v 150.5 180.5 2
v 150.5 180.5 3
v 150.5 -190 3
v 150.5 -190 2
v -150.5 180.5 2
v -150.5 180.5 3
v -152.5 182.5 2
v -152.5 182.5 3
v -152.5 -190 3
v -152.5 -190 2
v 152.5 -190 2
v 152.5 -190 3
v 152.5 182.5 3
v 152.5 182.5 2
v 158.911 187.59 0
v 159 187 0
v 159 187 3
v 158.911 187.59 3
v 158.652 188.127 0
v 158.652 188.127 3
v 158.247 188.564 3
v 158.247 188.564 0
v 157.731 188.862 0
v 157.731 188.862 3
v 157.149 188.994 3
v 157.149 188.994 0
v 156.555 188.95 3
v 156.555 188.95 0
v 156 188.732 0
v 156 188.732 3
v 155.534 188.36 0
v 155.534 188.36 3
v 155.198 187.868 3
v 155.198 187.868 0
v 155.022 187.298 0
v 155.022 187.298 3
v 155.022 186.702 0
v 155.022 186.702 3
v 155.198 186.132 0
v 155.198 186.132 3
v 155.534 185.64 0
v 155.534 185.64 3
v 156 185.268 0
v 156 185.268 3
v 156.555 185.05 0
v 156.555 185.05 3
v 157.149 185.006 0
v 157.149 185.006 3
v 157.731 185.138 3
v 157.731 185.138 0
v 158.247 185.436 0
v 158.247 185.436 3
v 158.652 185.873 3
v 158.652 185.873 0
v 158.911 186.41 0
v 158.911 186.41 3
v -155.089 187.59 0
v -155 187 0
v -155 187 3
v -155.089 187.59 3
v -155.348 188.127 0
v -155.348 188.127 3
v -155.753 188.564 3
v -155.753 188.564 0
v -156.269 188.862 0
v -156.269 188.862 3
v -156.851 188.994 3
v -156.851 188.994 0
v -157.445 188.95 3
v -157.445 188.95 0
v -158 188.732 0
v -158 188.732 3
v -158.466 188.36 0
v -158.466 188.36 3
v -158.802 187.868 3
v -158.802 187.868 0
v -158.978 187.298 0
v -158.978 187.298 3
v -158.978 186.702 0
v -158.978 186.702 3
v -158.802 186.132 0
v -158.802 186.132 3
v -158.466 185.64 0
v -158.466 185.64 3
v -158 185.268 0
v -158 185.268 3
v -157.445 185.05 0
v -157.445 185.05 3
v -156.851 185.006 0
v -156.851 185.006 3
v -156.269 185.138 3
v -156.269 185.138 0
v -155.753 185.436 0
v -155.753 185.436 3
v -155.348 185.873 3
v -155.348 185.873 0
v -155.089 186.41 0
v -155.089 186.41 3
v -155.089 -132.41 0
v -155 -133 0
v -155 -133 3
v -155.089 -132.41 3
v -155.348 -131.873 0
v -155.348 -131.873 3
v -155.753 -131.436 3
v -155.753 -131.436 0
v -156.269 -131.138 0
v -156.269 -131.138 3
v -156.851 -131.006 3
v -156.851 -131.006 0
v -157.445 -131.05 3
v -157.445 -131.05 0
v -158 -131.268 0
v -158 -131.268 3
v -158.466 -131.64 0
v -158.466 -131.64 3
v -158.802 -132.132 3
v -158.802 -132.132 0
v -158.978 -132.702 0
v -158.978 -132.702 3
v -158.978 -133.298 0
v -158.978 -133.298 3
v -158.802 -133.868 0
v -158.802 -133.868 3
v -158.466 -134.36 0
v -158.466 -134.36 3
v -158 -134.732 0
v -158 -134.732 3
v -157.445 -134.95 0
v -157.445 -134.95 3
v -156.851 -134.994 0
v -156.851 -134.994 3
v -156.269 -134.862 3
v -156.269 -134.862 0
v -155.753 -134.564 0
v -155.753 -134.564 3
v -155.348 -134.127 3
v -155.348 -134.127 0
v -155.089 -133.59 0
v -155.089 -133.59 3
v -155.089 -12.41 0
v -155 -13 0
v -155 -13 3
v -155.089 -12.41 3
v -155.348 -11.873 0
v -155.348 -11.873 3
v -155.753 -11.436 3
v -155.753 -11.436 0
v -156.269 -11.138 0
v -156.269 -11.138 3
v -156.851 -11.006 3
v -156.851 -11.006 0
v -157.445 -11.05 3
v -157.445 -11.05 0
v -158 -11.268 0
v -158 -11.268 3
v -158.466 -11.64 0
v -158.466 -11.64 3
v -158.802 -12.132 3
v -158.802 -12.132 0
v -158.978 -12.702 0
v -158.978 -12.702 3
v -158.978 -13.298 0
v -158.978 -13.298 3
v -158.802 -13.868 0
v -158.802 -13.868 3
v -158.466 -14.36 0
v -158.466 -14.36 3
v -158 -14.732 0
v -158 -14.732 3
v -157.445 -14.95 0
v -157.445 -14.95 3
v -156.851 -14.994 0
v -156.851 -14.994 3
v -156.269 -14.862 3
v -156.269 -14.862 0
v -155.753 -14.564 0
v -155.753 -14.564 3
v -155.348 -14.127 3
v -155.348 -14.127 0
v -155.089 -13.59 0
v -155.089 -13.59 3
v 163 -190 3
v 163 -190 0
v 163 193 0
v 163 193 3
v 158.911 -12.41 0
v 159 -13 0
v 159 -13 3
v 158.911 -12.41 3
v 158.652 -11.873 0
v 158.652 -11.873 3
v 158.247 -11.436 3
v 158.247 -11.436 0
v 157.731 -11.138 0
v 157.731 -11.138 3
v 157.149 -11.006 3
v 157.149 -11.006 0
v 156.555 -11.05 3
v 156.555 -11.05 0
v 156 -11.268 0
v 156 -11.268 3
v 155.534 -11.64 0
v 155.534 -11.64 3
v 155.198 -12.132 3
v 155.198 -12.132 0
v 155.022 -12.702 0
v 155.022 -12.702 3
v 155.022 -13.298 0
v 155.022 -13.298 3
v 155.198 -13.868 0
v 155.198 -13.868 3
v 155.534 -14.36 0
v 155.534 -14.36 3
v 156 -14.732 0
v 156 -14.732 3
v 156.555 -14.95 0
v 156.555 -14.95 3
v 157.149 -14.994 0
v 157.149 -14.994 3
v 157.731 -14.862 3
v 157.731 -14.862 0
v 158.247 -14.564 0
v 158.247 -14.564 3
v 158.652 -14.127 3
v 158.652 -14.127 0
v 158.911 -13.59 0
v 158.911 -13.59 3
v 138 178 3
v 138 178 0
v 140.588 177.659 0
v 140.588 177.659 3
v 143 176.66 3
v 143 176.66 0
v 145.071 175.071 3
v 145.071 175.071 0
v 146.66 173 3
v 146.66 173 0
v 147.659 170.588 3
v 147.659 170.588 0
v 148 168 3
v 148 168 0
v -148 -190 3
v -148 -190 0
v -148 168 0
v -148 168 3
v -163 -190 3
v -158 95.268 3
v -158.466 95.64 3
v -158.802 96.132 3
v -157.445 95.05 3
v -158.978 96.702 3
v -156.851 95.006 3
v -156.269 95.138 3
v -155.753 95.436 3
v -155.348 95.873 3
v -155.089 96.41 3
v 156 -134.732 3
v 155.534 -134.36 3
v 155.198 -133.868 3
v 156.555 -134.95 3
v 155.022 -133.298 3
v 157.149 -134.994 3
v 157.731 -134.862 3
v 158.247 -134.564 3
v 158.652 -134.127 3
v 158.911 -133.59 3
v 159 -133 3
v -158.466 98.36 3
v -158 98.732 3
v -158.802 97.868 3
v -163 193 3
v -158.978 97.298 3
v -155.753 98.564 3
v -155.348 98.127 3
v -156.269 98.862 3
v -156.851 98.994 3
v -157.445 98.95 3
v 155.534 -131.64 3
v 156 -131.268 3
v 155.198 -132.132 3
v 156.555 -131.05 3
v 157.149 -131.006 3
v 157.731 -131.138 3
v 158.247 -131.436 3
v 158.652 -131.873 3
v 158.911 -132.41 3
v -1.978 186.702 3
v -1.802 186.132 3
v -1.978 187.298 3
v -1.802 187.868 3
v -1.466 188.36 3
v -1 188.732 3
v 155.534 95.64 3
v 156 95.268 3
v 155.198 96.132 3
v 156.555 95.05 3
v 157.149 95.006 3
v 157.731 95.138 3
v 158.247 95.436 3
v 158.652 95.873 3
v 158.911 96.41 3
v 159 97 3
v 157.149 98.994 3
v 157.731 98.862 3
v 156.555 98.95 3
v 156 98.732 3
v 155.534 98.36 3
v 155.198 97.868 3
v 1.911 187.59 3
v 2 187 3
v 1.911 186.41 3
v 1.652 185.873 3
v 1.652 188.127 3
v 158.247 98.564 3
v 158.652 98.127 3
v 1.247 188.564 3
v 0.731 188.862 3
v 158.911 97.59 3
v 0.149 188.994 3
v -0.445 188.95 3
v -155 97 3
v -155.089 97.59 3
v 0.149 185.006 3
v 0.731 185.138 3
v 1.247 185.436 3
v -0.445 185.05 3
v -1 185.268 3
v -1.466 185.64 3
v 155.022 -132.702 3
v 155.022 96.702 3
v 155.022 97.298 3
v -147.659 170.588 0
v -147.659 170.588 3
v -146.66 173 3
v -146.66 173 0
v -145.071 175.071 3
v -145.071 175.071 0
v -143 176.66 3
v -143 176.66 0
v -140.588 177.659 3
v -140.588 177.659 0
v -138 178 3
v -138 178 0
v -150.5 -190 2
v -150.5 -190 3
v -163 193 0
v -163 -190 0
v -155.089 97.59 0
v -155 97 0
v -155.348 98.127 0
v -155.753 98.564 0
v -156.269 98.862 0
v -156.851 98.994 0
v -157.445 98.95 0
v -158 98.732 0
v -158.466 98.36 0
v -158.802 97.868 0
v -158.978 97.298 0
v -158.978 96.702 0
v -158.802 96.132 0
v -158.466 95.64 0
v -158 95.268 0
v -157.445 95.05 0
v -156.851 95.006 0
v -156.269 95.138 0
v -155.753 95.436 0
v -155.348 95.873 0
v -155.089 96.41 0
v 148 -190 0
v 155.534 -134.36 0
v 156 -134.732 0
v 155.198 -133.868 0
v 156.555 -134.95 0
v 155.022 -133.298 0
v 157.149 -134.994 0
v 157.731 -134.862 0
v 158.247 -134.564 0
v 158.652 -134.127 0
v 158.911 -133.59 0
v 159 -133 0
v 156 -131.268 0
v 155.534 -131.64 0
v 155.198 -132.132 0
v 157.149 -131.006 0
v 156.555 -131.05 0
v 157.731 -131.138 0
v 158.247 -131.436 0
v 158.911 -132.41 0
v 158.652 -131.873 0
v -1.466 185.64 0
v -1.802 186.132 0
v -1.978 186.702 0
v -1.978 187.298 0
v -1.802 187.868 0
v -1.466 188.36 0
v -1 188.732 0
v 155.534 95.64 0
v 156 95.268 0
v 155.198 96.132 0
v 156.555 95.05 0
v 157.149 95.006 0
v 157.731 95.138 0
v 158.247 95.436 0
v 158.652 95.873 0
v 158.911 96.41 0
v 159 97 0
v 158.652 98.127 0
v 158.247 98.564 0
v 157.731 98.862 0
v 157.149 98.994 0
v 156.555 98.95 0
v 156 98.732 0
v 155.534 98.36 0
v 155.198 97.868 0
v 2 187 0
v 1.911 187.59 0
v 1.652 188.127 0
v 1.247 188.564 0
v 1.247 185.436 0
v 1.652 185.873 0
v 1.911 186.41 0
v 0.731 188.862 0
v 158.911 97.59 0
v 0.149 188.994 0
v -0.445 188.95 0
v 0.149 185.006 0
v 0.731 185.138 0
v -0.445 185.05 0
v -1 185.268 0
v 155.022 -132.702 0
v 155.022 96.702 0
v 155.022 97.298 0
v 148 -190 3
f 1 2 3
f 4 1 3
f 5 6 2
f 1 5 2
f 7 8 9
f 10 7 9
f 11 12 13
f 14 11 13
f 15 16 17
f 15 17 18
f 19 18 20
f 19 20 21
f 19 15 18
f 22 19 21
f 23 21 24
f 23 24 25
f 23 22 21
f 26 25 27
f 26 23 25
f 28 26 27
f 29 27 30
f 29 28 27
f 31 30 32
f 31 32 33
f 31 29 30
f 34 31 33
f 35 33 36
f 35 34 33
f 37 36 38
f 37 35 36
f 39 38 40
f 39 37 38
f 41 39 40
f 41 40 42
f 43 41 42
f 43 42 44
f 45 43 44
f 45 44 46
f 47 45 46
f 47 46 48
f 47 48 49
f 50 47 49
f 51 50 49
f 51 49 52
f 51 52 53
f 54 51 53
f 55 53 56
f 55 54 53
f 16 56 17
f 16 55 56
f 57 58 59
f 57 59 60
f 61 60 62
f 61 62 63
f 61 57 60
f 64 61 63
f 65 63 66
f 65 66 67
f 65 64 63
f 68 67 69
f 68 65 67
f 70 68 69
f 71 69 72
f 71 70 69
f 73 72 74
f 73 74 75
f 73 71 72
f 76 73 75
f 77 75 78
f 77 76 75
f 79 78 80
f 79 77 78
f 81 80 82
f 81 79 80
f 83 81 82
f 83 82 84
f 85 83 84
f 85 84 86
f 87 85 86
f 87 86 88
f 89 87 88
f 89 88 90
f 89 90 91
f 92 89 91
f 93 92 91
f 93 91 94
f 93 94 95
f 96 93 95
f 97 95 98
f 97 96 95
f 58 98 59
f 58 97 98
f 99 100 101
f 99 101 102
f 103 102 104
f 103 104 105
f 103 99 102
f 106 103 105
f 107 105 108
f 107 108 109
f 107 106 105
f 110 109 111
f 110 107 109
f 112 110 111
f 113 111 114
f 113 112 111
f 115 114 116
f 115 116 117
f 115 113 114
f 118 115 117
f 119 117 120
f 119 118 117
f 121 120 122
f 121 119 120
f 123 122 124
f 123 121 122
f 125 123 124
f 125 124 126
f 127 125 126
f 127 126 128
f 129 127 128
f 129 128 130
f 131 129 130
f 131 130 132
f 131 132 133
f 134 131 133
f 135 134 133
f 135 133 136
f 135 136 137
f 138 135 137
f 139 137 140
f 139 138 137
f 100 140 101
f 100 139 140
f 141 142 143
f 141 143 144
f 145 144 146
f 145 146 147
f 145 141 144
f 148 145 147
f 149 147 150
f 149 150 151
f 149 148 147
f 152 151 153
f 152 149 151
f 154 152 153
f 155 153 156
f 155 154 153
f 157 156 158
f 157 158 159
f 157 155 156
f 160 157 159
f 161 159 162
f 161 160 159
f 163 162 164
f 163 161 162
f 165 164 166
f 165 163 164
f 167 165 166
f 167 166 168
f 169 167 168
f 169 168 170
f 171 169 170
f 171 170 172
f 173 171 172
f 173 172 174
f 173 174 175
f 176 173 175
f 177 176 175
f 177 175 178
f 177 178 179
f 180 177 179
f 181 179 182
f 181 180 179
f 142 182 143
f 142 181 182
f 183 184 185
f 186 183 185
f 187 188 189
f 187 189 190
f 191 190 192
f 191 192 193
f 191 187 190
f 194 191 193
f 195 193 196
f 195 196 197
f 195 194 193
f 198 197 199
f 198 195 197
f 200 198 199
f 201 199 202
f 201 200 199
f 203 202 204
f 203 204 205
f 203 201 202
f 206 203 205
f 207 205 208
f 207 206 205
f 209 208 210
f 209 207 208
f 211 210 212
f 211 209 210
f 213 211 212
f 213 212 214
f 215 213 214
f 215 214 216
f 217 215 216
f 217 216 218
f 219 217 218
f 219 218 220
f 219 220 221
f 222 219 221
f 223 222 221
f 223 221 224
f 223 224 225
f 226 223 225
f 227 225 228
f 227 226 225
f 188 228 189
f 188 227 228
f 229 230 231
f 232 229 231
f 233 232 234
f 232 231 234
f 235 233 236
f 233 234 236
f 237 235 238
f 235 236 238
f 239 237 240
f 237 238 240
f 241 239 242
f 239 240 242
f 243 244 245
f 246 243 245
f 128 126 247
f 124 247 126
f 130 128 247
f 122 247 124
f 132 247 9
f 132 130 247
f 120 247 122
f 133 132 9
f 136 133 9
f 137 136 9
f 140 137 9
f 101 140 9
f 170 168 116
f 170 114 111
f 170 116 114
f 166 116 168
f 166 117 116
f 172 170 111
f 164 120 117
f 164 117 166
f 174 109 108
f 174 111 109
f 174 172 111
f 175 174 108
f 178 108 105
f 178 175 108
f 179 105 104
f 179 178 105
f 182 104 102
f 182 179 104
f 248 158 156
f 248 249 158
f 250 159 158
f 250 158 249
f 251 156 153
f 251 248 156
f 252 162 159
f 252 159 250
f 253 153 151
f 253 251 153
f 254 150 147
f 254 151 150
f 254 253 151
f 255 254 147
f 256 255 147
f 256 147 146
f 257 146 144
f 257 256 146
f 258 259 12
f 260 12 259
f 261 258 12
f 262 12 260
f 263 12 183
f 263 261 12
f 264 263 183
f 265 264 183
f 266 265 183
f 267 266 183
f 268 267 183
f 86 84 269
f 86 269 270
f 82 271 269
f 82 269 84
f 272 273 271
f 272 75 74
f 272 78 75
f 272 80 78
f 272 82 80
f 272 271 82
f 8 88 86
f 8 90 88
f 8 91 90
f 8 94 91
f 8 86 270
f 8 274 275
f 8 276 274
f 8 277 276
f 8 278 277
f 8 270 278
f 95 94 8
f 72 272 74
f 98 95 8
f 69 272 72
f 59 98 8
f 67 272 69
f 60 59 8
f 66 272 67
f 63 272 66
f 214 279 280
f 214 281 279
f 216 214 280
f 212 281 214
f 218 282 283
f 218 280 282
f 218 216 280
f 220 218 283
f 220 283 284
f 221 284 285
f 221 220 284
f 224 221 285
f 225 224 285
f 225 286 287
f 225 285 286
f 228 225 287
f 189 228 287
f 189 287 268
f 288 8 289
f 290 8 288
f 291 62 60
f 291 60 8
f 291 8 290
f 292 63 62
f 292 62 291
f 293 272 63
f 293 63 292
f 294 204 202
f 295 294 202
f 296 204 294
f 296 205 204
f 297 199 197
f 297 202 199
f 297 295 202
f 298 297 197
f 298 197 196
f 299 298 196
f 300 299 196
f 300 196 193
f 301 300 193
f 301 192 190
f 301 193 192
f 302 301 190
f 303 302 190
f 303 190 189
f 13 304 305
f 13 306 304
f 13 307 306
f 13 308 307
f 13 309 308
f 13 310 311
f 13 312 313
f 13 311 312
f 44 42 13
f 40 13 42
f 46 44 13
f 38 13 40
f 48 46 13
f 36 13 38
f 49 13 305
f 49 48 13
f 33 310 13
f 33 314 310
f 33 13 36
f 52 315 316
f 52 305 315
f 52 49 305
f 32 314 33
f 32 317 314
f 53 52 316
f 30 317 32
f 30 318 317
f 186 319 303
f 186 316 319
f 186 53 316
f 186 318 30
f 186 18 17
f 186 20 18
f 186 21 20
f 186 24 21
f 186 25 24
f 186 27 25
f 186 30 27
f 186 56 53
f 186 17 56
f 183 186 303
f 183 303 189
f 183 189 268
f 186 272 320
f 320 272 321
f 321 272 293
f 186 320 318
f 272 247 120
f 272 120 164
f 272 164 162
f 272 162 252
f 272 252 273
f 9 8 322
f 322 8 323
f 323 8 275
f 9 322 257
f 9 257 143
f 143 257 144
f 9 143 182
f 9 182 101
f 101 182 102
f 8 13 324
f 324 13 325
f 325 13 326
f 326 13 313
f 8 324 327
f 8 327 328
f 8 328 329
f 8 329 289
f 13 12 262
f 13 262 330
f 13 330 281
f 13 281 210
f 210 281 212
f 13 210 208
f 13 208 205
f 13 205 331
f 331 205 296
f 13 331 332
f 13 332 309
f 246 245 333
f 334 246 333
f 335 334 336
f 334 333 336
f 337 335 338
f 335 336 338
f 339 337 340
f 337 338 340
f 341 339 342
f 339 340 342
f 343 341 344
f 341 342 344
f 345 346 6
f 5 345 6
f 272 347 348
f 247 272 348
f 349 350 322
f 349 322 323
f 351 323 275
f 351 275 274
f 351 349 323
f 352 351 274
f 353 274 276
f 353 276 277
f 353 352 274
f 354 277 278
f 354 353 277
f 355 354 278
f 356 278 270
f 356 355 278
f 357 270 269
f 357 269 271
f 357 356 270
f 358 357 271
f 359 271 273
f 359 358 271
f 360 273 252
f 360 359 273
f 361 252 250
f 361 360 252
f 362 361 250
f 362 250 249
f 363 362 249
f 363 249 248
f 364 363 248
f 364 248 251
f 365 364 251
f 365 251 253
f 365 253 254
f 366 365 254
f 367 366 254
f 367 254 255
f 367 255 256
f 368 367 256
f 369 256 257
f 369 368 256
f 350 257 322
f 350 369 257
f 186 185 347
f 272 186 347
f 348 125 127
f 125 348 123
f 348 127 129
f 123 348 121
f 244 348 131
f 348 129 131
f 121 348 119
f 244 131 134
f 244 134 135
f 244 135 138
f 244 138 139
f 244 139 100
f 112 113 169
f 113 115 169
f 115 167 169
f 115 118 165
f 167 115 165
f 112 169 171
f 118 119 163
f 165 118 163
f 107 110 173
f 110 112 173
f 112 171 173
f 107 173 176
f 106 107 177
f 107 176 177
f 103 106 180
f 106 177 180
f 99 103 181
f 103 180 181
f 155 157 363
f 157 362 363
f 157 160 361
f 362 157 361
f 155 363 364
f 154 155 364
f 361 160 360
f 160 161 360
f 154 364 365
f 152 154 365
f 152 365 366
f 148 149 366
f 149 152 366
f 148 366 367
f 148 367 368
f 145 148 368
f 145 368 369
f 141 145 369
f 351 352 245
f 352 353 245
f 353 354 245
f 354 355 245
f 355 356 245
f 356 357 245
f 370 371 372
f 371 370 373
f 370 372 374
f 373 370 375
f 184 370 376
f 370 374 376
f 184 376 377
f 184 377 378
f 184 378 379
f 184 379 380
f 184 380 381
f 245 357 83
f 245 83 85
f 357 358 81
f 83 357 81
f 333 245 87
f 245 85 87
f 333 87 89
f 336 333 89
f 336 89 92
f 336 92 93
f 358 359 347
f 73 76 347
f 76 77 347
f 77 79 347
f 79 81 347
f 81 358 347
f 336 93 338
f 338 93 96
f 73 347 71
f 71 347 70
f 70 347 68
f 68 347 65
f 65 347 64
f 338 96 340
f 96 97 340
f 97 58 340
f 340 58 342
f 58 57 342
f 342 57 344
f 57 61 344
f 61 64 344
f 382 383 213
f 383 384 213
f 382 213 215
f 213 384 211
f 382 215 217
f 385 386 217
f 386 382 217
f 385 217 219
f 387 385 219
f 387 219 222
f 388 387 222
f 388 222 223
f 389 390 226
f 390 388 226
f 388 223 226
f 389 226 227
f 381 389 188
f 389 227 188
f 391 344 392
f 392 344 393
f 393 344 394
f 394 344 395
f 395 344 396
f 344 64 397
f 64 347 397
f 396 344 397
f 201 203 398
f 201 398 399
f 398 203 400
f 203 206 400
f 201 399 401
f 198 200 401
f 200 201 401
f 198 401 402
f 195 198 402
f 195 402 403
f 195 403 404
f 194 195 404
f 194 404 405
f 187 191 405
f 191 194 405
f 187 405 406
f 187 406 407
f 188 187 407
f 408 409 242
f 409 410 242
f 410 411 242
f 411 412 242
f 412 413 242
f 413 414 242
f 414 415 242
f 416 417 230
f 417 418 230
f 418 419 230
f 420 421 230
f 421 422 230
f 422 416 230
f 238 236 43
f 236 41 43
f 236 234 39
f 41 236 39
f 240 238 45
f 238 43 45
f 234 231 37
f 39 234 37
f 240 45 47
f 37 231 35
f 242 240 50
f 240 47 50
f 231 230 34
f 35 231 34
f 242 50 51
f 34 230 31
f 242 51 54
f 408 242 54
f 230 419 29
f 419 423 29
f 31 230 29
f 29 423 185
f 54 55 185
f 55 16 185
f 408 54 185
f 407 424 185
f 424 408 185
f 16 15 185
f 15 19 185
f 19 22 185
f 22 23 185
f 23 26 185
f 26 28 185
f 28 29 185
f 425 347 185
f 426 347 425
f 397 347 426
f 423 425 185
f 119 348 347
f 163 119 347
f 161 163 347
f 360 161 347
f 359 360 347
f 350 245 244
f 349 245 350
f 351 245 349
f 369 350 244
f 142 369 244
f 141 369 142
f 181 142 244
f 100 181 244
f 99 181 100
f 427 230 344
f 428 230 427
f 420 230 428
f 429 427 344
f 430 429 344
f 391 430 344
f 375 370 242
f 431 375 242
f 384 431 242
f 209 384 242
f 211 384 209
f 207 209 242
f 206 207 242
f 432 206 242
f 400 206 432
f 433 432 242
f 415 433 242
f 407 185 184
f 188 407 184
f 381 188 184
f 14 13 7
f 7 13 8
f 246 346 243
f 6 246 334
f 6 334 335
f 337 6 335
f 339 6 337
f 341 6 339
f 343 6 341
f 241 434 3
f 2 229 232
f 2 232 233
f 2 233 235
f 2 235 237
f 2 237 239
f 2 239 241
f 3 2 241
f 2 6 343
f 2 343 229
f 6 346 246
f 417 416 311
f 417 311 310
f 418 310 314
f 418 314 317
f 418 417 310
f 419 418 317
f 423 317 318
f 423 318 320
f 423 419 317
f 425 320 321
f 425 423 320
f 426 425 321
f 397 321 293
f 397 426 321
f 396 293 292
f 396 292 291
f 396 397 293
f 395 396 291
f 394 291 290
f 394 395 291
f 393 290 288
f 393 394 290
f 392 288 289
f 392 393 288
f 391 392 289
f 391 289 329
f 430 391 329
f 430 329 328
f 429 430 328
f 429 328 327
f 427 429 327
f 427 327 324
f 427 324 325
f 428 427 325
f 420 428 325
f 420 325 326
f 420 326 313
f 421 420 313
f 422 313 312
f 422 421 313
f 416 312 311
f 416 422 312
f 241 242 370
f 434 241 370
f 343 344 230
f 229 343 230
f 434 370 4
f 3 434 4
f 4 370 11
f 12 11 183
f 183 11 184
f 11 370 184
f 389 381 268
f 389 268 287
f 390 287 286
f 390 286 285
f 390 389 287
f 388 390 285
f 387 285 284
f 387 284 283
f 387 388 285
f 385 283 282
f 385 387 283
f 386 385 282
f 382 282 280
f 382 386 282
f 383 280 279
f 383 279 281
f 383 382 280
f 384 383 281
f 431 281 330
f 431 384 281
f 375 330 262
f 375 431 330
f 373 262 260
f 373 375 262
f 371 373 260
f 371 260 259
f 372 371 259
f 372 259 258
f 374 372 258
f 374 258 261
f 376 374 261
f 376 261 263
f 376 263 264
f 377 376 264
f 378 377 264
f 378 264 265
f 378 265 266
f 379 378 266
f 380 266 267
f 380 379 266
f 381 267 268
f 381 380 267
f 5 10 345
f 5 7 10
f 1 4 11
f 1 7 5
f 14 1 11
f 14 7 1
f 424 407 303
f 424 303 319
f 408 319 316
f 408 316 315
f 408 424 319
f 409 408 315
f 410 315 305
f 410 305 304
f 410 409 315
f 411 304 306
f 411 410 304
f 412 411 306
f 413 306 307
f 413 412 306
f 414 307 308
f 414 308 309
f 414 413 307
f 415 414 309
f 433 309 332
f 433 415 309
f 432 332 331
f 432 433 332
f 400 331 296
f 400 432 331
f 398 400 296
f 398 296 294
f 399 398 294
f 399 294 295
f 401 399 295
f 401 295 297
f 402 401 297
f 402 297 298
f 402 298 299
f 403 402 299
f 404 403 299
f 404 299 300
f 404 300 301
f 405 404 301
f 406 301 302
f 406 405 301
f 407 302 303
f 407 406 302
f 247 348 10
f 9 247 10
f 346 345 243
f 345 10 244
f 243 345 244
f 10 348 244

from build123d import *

# Parameters (mm, degrees)
SKETCH1_R           = 2
BOSS_EXTRUDE1_DEPTH = 3
GROOVE_DEPTH        = 1


with BuildPart() as part:
    # Sketch1 → Boss-Extrude1 (new body)
    with BuildSketch(Plane.XY):
        with BuildLine():
            Line((163, 193), (-163, 193))
            Line((-163, 193), (-163, -190))
            Line((-163, -190), (-148, -190))
            Line((-148, -190), (-148, -173))
            Line((-148, -173), (-148, 168))
            ThreePointArc((-148, 168), (-145.071067812, 175.071067812), (-138, 178))
            Line((-138, 178), (138, 178))
            ThreePointArc((138, 178), (145.071067812, 175.071067812), (148, 168))
            Line((148, 168), (148, -173))
            Line((148, -173), (148, -190))
            Line((148, -190), (163, -190))
            Line((163, -190), (163, 193))
        make_face()
        with Locations((-157, -133)):
            Circle(SKETCH1_R, mode=Mode.SUBTRACT)
        with Locations((-157, -13)):
            Circle(SKETCH1_R, mode=Mode.SUBTRACT)
        with Locations((157, -133)):
            Circle(SKETCH1_R, mode=Mode.SUBTRACT)
        with Locations((157, -13)):
            Circle(SKETCH1_R, mode=Mode.SUBTRACT)
        with Locations((-157, 97)):
            Circle(SKETCH1_R, mode=Mode.SUBTRACT)
        with Locations((-157, 187)):
            Circle(SKETCH1_R, mode=Mode.SUBTRACT)
        with Locations((0, 187)):
            Circle(SKETCH1_R, mode=Mode.SUBTRACT)
        with Locations((157, 97)):
            Circle(SKETCH1_R, mode=Mode.SUBTRACT)
        with Locations((157, 187)):
            Circle(SKETCH1_R, mode=Mode.SUBTRACT)
    extrude(amount=BOSS_EXTRUDE1_DEPTH)

    # Sketch2 → Groove (cut)
    with BuildSketch(Plane.XY.offset(3)):
        Polygon((-152.5, -190), (-150.5, -190), (-150.5, 180.5), (150.5, 180.5), (150.5, -190), (152.5, -190), (152.5, 182.5), (-152.5, 182.5), align=None)
    extrude(amount=-GROOVE_DEPTH, mode=Mode.SUBTRACT)


solid = part.part
